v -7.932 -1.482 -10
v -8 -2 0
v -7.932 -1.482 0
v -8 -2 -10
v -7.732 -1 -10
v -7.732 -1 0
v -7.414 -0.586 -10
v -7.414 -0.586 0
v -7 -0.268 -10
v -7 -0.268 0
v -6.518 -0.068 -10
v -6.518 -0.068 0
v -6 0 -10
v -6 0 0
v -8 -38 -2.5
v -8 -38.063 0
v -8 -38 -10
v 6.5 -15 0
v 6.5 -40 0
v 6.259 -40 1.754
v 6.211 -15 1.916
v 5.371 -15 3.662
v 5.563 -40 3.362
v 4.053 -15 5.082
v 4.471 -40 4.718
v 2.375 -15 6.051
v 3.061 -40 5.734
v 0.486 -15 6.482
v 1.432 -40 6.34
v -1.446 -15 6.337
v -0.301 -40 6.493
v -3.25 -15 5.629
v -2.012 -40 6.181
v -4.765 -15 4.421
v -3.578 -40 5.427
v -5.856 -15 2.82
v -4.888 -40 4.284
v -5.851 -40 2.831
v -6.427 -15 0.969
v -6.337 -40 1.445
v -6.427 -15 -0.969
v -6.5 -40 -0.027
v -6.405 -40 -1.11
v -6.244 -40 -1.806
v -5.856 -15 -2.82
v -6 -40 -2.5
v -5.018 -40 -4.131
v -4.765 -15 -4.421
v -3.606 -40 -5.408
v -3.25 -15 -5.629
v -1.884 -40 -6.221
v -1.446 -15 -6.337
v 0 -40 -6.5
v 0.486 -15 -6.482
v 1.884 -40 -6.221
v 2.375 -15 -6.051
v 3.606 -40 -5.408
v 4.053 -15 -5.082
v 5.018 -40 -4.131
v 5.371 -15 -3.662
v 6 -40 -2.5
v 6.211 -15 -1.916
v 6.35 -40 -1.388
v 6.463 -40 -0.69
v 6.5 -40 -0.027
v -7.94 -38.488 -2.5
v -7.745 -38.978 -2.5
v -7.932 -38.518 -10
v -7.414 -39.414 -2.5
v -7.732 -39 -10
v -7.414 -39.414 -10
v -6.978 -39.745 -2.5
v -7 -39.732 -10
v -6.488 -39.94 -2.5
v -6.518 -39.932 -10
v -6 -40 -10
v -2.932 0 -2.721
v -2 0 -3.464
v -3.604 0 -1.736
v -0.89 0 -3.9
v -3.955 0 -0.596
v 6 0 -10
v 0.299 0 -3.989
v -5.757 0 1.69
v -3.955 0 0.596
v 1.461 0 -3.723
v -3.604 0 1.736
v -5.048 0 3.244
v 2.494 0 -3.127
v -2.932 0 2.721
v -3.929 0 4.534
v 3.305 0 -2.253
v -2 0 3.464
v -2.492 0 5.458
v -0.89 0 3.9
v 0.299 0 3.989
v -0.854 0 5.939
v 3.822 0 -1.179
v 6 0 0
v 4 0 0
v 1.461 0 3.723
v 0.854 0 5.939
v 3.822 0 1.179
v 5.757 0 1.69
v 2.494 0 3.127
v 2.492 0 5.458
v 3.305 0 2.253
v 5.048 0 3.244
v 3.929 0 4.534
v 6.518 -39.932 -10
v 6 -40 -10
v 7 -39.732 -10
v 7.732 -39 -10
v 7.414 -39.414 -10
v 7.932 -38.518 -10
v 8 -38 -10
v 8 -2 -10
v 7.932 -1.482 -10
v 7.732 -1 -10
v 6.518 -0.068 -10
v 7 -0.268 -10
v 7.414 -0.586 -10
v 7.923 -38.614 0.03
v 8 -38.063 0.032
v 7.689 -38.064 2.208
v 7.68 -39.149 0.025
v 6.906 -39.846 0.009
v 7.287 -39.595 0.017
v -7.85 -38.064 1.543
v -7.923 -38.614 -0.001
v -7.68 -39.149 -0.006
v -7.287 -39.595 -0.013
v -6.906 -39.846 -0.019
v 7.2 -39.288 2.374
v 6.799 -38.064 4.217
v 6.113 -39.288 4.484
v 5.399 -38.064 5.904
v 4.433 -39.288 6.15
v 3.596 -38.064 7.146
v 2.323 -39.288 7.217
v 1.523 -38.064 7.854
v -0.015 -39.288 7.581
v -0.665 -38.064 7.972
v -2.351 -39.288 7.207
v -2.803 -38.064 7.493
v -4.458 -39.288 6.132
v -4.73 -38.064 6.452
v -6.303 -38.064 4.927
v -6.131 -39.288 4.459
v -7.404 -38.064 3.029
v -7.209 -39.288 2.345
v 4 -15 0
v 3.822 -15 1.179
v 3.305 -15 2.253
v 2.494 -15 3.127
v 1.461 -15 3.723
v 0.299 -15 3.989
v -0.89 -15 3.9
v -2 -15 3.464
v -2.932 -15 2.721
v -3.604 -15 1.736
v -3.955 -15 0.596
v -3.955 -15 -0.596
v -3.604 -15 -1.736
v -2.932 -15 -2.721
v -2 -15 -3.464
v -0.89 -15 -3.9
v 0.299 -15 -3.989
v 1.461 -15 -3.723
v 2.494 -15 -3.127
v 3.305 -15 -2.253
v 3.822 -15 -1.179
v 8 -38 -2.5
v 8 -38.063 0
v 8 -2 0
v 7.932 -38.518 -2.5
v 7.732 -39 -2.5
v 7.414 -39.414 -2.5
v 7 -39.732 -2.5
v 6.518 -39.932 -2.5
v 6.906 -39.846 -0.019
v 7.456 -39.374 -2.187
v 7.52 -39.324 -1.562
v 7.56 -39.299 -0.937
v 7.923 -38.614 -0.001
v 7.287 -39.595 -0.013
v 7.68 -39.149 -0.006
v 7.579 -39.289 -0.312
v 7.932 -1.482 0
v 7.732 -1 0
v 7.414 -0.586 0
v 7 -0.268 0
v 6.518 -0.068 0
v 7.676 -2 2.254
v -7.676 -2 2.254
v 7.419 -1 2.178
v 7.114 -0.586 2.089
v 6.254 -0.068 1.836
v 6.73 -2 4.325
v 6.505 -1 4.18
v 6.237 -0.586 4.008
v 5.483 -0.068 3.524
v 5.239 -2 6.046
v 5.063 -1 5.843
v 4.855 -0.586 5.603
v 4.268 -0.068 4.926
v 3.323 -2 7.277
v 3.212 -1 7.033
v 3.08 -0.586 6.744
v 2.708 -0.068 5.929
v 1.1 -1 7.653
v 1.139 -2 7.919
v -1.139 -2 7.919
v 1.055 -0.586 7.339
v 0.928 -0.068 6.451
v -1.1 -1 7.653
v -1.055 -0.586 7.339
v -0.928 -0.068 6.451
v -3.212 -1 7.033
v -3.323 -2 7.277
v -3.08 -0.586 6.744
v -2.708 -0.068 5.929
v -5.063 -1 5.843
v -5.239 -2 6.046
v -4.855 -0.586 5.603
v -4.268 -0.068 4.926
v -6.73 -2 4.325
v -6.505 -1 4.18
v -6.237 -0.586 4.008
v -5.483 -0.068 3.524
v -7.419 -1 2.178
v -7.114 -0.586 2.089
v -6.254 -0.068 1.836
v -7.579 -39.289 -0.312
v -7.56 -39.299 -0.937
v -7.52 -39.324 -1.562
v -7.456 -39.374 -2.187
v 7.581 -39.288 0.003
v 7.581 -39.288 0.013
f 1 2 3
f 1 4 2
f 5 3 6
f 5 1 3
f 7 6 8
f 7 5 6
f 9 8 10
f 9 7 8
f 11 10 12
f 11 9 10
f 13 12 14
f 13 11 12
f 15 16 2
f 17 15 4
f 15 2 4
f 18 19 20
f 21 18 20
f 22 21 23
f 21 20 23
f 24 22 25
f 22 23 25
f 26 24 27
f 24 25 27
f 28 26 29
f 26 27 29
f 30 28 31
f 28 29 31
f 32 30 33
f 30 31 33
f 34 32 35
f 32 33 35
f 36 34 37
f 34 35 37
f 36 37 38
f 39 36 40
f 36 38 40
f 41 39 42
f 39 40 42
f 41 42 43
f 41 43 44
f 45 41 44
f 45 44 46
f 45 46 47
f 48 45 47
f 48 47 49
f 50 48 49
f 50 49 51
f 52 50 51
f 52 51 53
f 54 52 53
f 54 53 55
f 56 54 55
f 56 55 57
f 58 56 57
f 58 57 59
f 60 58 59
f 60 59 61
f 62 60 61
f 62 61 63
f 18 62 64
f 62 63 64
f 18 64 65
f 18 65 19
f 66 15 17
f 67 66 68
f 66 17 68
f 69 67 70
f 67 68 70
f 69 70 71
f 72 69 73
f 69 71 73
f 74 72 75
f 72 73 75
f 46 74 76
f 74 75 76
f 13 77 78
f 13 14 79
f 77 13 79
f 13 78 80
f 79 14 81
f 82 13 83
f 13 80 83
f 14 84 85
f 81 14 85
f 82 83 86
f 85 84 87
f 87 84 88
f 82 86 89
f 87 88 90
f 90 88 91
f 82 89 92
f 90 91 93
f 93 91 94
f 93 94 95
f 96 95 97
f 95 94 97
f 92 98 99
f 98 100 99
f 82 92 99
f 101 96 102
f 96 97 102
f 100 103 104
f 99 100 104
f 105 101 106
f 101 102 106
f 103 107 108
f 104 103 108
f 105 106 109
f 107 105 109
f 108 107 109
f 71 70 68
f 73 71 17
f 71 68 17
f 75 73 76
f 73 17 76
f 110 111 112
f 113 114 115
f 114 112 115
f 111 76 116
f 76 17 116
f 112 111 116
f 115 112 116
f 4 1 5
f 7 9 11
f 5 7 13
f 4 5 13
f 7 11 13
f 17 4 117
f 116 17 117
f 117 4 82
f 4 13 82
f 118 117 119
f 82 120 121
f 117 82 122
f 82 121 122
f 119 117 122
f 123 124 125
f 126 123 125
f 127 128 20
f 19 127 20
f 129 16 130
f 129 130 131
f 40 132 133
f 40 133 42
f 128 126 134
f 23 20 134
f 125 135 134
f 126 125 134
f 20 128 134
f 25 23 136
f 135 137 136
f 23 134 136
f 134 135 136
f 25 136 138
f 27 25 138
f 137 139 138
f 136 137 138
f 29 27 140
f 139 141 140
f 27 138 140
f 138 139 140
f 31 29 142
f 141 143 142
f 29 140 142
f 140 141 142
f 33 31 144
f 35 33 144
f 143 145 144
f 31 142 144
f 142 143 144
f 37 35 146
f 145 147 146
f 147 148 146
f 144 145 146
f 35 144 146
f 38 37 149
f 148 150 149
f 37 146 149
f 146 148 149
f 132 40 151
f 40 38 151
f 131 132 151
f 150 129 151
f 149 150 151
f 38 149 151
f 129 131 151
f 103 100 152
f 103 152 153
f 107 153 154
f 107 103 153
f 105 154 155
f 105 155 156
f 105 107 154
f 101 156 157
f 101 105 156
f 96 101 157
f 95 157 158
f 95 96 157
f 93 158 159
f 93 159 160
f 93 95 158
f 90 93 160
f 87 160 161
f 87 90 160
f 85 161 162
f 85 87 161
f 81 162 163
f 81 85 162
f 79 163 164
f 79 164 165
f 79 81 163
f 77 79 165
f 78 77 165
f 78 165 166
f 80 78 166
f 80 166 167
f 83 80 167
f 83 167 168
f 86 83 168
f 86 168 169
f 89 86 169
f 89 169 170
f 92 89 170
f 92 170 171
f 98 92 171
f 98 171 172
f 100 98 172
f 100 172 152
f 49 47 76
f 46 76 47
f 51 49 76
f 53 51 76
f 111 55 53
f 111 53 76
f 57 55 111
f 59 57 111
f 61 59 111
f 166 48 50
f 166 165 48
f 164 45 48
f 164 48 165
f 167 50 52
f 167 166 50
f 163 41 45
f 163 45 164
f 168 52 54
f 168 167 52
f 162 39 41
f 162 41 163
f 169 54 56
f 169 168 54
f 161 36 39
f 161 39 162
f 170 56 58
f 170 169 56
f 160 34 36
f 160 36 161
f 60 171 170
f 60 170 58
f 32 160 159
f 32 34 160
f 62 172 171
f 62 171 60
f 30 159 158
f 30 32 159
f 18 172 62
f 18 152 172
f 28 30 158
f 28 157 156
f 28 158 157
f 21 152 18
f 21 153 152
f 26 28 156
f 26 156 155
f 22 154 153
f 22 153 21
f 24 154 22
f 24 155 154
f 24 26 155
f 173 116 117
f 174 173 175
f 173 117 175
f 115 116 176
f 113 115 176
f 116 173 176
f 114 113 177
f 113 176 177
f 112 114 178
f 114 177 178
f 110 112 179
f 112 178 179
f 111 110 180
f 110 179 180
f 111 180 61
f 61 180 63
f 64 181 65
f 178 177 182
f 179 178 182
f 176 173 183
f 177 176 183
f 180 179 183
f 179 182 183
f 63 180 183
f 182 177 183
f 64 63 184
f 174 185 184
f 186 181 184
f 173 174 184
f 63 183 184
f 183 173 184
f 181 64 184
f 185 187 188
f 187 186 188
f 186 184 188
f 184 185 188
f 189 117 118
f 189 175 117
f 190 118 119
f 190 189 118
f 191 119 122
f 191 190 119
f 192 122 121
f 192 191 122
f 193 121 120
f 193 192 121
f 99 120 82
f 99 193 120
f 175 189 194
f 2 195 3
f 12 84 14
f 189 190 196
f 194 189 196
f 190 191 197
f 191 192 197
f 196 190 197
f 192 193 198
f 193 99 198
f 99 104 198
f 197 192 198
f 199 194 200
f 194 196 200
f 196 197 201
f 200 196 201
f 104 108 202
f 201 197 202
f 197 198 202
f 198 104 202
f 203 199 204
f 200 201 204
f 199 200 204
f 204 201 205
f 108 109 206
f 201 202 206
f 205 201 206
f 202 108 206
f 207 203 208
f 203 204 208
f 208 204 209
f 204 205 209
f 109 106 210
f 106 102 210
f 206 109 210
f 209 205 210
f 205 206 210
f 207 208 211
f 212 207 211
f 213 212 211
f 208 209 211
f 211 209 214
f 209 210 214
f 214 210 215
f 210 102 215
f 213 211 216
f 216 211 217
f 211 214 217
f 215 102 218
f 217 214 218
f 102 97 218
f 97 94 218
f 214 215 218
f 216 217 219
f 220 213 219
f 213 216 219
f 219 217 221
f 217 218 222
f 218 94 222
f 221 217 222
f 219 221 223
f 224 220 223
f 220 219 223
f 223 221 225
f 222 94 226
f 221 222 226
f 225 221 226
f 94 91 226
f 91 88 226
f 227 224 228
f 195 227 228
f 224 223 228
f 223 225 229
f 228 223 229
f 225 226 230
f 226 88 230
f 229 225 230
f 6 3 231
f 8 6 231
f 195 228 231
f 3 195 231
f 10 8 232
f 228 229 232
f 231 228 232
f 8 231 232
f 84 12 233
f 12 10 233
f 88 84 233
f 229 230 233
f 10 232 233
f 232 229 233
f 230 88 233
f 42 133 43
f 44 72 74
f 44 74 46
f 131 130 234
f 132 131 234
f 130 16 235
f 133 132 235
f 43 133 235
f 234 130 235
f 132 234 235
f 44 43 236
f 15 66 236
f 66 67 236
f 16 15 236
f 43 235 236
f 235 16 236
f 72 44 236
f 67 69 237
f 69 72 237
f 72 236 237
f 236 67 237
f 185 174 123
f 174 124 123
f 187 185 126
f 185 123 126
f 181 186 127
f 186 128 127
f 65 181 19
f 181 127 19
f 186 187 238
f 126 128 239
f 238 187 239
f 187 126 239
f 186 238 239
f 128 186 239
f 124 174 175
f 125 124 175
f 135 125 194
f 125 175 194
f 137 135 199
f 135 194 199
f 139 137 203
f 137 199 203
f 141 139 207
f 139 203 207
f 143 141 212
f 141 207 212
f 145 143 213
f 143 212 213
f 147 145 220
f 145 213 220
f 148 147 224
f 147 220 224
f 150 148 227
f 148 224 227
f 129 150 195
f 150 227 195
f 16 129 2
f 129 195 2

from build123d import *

# Parameters (mm, degrees)
F0_R     = 4
F1_DEPTH = 40
F2_R     = 6.5
F2_R_2   = 4
F3_DEPTH = 25
F4_R     = 2


with BuildPart() as f1:
    # F0 (on Front) → F1 (new body)
    with BuildSketch(Plane.XZ):
        with BuildLine():
            ThreePointArc((-8, 0), (0, -8), (8, 0))
            ThreePointArc((8, 0), (0, 8), (-8, 0))
        make_face()
        Circle(F0_R, mode=Mode.SUBTRACT)
        with BuildLine():
            Line((8, -10), (8, 0))
            ThreePointArc((8, 0), (0, -8), (-8, 0))
            Line((-8, 0), (-8, -10))
            Line((-8, -10), (8, -10))
        make_face()
    extrude(amount=F1_DEPTH)

    # F2 (on face) → F3 (cut)
    with BuildSketch(Plane.XZ.offset(40)):
        Circle(F2_R)
        Circle(F2_R_2, mode=Mode.SUBTRACT)
    extrude(amount=-F3_DEPTH, mode=Mode.SUBTRACT)

    # F4
    f4_edges = [f1.edges().sort_by_distance(p)[0] for p in [
        (0, -40, 8),
        (0, 0, 8),
    ]]
    fillet(f4_edges, radius=F4_R)


solid = f1.part
